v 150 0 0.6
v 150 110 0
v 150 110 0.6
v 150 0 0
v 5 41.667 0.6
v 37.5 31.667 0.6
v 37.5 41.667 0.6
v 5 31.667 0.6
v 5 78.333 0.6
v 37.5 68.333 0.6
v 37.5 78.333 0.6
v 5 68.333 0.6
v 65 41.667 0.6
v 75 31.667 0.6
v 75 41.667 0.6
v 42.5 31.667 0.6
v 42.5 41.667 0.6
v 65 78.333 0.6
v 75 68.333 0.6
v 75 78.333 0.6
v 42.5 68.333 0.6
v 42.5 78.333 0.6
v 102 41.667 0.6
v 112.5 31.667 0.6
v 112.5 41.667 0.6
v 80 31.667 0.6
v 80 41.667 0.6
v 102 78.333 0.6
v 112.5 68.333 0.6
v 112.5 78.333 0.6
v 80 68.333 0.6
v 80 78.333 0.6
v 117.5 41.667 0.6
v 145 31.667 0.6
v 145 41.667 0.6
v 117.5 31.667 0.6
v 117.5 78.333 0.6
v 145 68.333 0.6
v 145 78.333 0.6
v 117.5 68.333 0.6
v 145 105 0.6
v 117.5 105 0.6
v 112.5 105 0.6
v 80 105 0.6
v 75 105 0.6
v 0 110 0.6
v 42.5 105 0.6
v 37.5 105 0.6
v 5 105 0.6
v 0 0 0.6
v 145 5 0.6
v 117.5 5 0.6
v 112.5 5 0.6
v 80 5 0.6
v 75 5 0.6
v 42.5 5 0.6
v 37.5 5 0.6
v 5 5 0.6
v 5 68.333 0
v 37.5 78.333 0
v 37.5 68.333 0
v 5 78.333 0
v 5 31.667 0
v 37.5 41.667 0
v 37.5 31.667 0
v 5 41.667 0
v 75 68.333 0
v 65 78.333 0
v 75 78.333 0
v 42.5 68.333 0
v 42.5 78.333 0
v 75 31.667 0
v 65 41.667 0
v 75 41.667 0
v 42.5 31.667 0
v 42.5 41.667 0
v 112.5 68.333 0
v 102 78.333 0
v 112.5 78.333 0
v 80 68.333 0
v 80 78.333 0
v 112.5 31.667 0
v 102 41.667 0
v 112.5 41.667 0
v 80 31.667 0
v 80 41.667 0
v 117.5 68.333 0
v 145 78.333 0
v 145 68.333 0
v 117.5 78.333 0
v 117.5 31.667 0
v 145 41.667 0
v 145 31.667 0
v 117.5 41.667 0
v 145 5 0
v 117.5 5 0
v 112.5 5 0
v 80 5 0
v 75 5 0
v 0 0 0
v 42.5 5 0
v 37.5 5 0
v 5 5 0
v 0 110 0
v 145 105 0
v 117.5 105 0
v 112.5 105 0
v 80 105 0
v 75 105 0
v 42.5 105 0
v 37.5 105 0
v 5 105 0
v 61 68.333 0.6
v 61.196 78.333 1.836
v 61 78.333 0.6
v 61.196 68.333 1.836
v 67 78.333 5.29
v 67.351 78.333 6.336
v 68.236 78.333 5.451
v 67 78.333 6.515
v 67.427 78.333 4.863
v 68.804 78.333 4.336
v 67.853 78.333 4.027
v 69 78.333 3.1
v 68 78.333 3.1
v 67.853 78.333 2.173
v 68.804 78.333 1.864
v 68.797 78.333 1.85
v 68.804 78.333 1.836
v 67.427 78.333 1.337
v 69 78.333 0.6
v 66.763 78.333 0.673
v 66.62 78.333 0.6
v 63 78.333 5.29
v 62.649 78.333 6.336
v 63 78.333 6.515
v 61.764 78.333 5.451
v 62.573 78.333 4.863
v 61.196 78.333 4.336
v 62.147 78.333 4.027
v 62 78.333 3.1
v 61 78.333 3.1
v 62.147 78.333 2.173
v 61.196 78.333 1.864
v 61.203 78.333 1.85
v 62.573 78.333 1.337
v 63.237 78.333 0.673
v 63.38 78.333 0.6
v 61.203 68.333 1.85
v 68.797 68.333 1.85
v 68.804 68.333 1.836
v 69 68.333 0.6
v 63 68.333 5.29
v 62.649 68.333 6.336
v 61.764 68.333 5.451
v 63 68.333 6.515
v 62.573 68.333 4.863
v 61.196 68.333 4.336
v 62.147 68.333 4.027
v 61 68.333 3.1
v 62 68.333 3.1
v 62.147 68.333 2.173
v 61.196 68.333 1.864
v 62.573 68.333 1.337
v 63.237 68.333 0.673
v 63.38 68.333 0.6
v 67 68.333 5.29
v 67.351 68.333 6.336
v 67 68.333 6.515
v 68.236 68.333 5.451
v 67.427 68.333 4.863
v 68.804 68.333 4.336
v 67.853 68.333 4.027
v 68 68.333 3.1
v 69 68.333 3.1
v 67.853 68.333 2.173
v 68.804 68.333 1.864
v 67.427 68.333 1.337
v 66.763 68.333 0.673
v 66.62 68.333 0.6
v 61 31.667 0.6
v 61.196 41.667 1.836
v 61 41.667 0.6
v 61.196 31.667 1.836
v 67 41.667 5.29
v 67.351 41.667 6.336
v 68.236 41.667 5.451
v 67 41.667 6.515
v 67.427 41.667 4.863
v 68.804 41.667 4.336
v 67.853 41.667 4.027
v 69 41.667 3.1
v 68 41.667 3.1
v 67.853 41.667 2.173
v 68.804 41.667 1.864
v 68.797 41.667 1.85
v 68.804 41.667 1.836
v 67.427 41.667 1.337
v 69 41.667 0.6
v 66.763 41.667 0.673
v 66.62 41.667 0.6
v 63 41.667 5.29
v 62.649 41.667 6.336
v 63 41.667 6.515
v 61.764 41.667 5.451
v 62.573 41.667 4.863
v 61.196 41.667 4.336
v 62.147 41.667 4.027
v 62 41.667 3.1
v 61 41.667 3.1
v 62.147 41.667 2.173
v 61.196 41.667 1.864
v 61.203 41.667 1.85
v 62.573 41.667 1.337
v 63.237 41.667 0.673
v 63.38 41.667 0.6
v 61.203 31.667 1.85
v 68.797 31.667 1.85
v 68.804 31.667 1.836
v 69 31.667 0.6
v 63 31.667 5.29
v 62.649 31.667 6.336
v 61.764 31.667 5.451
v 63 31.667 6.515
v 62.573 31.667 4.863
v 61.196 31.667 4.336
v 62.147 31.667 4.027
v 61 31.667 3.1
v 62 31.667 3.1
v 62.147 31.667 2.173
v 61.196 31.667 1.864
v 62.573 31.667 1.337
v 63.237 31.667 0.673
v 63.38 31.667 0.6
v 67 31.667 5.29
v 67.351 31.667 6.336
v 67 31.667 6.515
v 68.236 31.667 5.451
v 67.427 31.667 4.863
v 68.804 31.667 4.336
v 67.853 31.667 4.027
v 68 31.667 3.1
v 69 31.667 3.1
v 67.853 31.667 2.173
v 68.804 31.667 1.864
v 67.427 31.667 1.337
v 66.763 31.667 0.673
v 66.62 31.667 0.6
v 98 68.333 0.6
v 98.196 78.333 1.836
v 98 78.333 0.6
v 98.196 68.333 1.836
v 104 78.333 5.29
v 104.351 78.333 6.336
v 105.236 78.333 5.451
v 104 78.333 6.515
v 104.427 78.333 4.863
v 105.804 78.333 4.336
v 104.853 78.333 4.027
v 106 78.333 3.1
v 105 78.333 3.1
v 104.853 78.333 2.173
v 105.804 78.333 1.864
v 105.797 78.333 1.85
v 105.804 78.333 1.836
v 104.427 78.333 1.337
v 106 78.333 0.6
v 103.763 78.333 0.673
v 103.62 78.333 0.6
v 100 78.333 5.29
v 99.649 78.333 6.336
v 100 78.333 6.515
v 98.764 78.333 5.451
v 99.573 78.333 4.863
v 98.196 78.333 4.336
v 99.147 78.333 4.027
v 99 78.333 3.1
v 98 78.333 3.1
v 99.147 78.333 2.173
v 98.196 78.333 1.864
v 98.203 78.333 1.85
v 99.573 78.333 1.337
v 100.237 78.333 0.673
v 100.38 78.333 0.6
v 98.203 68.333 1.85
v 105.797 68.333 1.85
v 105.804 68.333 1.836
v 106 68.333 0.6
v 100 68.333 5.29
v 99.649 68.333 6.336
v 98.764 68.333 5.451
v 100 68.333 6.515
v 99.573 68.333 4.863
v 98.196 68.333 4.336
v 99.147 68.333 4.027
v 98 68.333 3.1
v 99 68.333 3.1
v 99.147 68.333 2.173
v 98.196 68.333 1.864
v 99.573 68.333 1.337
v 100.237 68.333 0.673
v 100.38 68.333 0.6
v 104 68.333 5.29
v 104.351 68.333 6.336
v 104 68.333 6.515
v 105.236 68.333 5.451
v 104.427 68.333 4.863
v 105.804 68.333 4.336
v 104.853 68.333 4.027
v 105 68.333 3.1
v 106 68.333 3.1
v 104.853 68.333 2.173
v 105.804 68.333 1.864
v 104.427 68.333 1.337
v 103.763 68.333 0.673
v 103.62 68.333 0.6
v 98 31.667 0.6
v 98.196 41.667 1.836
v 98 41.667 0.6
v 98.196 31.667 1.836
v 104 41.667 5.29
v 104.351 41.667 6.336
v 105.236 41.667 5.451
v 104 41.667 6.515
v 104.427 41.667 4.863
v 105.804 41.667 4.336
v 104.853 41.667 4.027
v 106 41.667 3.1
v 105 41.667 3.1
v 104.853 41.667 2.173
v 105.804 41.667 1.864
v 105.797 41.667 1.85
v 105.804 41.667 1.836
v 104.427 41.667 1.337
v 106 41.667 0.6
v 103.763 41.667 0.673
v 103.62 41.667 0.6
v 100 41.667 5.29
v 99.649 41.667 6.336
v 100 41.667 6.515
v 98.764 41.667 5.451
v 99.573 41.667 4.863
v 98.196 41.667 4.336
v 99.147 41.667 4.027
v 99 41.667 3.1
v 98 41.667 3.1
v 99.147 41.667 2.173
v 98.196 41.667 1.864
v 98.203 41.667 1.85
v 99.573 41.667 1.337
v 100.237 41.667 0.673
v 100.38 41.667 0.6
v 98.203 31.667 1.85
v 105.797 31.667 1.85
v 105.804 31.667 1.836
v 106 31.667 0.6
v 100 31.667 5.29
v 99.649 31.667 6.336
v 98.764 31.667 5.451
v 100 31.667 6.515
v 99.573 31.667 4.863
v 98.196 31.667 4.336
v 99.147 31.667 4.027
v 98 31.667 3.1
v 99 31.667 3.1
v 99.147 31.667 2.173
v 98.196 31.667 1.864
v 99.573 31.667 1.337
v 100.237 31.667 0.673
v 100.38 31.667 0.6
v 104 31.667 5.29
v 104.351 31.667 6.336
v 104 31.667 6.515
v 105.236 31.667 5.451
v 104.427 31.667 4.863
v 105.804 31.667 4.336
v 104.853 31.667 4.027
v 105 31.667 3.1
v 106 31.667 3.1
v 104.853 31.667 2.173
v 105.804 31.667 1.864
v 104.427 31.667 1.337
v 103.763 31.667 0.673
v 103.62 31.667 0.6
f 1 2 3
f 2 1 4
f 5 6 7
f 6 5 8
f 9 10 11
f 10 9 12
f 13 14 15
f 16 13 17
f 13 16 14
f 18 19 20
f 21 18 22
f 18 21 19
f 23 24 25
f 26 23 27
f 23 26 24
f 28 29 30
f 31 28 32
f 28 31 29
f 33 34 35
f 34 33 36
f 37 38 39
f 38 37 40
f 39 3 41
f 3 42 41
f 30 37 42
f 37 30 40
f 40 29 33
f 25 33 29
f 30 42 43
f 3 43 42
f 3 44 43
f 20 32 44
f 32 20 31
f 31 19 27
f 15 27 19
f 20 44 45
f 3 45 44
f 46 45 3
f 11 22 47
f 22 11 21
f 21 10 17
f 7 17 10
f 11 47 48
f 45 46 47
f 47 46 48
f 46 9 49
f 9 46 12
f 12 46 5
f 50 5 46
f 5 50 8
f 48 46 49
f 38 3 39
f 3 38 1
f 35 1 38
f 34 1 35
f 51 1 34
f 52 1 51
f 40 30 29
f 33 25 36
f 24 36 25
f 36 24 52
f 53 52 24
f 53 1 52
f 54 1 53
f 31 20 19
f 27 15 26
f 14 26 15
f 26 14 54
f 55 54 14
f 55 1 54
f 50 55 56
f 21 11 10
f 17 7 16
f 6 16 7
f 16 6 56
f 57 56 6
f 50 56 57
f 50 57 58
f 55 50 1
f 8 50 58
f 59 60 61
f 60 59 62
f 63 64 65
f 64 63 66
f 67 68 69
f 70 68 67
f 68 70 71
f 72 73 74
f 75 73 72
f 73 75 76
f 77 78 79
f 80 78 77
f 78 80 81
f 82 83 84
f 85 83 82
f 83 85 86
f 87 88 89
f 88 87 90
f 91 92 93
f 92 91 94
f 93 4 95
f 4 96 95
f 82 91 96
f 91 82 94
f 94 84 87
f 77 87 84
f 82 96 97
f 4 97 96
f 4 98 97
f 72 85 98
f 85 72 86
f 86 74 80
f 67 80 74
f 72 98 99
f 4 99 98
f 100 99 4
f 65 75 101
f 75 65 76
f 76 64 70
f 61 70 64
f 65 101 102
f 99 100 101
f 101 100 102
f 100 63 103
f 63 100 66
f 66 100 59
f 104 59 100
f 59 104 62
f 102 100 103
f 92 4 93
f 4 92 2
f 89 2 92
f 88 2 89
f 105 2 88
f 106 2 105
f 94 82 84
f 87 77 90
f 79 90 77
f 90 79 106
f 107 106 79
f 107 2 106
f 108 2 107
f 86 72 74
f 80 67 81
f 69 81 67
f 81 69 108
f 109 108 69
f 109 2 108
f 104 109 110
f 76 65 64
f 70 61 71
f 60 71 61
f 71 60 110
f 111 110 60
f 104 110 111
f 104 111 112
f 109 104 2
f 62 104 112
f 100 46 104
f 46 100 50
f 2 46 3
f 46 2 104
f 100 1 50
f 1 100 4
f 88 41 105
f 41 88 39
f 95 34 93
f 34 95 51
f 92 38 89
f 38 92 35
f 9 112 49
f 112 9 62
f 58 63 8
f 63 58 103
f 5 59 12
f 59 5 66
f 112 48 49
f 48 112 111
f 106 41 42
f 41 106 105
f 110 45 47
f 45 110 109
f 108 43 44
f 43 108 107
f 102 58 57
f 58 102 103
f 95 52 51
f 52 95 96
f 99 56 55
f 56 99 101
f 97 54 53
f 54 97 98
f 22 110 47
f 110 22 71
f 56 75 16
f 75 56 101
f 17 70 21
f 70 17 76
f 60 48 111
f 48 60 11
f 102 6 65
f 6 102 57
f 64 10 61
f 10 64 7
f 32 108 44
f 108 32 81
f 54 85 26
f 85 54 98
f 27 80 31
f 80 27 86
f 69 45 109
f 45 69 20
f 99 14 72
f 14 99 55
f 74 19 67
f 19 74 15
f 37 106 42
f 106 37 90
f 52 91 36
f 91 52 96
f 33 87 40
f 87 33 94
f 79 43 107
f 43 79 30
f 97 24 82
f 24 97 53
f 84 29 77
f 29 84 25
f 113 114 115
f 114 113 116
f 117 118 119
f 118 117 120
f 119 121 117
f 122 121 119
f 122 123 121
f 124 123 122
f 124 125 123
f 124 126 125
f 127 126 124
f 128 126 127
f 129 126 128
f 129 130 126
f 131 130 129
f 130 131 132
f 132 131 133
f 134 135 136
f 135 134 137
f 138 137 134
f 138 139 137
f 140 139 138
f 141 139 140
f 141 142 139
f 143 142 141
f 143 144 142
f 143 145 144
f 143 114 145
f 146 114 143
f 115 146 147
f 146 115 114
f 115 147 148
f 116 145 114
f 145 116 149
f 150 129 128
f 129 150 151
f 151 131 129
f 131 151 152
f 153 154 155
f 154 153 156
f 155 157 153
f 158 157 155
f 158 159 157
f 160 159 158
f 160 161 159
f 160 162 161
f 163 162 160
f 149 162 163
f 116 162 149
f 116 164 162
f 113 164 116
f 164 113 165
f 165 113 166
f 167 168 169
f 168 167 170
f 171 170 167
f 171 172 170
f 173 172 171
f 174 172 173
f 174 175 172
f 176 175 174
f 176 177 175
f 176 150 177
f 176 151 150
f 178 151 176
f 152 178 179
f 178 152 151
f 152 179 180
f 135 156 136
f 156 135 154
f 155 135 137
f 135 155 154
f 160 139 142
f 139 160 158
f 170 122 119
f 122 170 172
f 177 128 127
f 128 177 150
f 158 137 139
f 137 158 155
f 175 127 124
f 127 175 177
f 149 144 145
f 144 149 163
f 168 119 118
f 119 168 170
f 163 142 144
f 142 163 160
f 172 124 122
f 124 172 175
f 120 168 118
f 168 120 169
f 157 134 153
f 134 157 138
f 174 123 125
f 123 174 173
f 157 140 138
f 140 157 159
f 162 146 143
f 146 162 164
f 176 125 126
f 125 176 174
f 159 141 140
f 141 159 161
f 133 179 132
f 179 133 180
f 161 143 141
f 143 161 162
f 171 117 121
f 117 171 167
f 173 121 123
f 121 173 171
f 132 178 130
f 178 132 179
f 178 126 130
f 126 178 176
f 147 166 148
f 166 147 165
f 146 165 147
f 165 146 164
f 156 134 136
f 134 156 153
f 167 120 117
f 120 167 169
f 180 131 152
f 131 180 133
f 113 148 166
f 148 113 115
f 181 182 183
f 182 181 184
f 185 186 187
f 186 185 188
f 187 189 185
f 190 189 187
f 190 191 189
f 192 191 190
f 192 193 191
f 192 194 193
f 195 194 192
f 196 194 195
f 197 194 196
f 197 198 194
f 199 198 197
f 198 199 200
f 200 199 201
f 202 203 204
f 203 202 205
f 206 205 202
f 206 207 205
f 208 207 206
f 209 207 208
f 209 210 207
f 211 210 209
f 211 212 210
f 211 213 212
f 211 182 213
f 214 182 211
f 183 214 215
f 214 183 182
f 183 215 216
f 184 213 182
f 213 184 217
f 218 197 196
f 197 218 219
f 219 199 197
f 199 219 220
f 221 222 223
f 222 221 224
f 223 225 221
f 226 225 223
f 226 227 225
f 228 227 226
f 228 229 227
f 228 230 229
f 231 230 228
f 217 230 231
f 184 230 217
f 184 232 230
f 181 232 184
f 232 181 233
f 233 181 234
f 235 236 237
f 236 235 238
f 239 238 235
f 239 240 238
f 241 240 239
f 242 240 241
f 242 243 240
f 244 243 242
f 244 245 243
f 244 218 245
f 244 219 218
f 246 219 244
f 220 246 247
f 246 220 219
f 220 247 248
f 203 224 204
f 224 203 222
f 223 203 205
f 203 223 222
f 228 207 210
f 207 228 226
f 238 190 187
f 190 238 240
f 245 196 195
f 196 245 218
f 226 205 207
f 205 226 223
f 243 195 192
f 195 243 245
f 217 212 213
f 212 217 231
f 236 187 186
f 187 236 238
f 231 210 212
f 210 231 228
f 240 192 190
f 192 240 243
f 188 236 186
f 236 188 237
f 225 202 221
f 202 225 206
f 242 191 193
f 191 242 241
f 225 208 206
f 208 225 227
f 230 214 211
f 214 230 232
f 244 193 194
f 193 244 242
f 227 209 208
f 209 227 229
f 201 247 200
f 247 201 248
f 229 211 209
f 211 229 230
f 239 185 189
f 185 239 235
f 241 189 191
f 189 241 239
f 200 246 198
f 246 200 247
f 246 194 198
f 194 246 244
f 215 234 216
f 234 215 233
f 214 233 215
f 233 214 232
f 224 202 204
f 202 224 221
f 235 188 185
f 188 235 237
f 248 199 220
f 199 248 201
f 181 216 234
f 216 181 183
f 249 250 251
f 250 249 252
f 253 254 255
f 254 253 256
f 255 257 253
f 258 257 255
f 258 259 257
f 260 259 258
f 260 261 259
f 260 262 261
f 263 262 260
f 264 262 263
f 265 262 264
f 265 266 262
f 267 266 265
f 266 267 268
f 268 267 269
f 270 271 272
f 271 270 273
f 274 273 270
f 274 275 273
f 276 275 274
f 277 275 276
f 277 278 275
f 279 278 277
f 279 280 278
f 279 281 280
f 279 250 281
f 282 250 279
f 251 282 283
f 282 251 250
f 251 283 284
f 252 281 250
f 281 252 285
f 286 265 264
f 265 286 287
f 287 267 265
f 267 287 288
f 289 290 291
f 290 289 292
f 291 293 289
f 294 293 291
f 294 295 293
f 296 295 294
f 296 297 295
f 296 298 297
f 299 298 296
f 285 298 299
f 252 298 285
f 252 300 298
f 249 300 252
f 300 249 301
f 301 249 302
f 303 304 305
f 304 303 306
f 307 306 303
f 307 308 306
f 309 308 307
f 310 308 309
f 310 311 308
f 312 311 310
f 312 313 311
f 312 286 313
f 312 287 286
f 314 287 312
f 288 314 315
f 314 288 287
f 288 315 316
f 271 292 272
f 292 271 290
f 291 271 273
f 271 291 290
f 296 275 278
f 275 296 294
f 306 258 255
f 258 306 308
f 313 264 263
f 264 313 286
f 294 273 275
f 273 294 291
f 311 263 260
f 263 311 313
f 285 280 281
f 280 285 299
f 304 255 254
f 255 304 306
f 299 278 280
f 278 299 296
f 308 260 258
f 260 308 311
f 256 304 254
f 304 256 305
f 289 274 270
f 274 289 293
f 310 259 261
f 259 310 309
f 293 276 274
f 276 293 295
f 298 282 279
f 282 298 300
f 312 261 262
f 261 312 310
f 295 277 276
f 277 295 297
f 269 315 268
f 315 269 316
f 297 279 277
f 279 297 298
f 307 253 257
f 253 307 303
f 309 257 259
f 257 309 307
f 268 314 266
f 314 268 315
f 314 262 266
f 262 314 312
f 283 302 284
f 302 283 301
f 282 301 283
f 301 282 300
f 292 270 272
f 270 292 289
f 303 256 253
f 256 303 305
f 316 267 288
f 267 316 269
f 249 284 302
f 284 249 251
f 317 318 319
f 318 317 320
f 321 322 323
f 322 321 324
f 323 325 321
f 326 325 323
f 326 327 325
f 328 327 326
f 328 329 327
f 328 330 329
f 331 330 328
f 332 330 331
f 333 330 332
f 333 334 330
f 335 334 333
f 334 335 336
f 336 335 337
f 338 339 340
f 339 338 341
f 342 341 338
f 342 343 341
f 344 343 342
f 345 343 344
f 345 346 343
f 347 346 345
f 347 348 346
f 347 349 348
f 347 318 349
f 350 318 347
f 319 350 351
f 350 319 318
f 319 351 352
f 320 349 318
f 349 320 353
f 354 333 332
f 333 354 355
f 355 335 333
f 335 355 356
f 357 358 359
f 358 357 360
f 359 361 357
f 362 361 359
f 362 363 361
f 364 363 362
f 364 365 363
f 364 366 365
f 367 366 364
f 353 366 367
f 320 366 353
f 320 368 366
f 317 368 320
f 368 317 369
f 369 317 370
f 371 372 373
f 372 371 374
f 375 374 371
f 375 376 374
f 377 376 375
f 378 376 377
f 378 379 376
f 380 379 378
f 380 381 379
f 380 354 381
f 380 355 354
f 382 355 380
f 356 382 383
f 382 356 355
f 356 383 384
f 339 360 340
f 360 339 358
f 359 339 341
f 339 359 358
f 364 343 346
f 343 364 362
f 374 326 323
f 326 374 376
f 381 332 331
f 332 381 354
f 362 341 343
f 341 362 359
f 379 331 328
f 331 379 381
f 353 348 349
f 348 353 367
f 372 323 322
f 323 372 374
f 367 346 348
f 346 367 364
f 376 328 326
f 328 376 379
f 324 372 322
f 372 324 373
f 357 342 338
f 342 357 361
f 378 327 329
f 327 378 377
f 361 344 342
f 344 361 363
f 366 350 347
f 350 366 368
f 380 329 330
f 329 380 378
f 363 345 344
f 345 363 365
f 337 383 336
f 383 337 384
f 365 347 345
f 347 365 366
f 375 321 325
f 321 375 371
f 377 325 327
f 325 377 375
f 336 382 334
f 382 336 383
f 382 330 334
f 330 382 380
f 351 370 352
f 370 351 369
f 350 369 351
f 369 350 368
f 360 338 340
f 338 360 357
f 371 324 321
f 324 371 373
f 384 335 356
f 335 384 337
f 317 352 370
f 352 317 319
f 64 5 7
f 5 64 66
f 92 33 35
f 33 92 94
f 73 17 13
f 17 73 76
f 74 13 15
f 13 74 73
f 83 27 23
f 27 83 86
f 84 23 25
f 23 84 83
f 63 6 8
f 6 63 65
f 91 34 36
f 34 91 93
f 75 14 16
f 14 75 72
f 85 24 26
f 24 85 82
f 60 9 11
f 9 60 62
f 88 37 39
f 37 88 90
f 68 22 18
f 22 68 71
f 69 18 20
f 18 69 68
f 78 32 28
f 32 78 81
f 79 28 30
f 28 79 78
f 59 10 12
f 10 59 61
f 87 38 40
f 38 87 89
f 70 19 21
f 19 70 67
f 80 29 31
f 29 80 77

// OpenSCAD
/*
    Dishwasher Grid Guard
    By Brian Khuu 2019
    
    Dishwasher detergent kept getting stuck if plates stacked incorrectly. A plastic guard solves this.
    https://www.reddit.com/r/functionalprint/comments/cbtglz/dishwasher_detergent_kept_getting_stuck_if_plates/
*/

$fn=20;

// Thickness
thickness=0.6;

// Wire Diameter
wire_dia=5;

// Wire Tolerance
wire_tol=1;

// Height
h=150;

// Width
w=110;

// Distance from bottom of first wire
c1=60;

// Distance from bottom of second wire
c2=c1+32+wire_dia;

module dishwasher_grid(h, w, thickness, wire_dia, wire_tol, c1, c2)
{
  module clip( wire_dia, baseh )
  {
    rotate([0,-90,90])
    union()
    {
      translate([baseh,0,0])
      difference()
      {
        union()
        {
          cylinder(r=(wire_dia+wire_tol)/2+1, h=wire_dia*2, center=true);
          translate([wire_dia/2,0,0])
            cylinder(r=(wire_dia+wire_tol)/2+1, h=wire_dia*2, center=true);
        }
        translate([wire_dia/2,0,0])
          cylinder(r=(wire_dia+wire_tol)/2, h=20, center=true);
        translate([wire_dia,0,0])
          cube([wire_dia,(wire_dia-1),wire_dia*3],center=true);
        translate([-wire_dia*4,-wire_dia*2,-wire_dia*2])
          cube([wire_dia*4, wire_dia*4, wire_dia*4]);
      }
      translate([baseh/2,0,0])
        rotate([0,90,0])
          cylinder(r=wire_dia, h=baseh, center=true);
    }
  }

  module clip_stick(baseh)
  {
    translate([wire_dia,w*2/3,0])
      clip(wire_dia,baseh);
    translate([wire_dia,w*1/3,0])
      clip(wire_dia,baseh);
  }

  // Frame
  difference()
  {
    cube([h,w,thickness]);
    translate([h/2,w/2,0])
      cube([h-wire_dia*2,w-wire_dia*2,thickness*3],center=true);
  }

  // Hoz Grid
  for(hi=[1:1:3])
  {
    translate([h*hi/4,0,0])
      cube([wire_dia,w,thickness]);
  }

  // Vertical Grid
  translate([0,w*1/3-wire_dia,0])
    cube([h,wire_dia*2,thickness]);
  translate([0,w*2/3-wire_dia,0])
    cube([h,wire_dia*2,thickness]);

  // Clips
  translate([c1,0,0])
    clip_stick(thickness);
  translate([c2,0,0])
    clip_stick(thickness);
}

dishwasher_grid(h, w, thickness, wire_dia, wire_tol, c1, c2);
